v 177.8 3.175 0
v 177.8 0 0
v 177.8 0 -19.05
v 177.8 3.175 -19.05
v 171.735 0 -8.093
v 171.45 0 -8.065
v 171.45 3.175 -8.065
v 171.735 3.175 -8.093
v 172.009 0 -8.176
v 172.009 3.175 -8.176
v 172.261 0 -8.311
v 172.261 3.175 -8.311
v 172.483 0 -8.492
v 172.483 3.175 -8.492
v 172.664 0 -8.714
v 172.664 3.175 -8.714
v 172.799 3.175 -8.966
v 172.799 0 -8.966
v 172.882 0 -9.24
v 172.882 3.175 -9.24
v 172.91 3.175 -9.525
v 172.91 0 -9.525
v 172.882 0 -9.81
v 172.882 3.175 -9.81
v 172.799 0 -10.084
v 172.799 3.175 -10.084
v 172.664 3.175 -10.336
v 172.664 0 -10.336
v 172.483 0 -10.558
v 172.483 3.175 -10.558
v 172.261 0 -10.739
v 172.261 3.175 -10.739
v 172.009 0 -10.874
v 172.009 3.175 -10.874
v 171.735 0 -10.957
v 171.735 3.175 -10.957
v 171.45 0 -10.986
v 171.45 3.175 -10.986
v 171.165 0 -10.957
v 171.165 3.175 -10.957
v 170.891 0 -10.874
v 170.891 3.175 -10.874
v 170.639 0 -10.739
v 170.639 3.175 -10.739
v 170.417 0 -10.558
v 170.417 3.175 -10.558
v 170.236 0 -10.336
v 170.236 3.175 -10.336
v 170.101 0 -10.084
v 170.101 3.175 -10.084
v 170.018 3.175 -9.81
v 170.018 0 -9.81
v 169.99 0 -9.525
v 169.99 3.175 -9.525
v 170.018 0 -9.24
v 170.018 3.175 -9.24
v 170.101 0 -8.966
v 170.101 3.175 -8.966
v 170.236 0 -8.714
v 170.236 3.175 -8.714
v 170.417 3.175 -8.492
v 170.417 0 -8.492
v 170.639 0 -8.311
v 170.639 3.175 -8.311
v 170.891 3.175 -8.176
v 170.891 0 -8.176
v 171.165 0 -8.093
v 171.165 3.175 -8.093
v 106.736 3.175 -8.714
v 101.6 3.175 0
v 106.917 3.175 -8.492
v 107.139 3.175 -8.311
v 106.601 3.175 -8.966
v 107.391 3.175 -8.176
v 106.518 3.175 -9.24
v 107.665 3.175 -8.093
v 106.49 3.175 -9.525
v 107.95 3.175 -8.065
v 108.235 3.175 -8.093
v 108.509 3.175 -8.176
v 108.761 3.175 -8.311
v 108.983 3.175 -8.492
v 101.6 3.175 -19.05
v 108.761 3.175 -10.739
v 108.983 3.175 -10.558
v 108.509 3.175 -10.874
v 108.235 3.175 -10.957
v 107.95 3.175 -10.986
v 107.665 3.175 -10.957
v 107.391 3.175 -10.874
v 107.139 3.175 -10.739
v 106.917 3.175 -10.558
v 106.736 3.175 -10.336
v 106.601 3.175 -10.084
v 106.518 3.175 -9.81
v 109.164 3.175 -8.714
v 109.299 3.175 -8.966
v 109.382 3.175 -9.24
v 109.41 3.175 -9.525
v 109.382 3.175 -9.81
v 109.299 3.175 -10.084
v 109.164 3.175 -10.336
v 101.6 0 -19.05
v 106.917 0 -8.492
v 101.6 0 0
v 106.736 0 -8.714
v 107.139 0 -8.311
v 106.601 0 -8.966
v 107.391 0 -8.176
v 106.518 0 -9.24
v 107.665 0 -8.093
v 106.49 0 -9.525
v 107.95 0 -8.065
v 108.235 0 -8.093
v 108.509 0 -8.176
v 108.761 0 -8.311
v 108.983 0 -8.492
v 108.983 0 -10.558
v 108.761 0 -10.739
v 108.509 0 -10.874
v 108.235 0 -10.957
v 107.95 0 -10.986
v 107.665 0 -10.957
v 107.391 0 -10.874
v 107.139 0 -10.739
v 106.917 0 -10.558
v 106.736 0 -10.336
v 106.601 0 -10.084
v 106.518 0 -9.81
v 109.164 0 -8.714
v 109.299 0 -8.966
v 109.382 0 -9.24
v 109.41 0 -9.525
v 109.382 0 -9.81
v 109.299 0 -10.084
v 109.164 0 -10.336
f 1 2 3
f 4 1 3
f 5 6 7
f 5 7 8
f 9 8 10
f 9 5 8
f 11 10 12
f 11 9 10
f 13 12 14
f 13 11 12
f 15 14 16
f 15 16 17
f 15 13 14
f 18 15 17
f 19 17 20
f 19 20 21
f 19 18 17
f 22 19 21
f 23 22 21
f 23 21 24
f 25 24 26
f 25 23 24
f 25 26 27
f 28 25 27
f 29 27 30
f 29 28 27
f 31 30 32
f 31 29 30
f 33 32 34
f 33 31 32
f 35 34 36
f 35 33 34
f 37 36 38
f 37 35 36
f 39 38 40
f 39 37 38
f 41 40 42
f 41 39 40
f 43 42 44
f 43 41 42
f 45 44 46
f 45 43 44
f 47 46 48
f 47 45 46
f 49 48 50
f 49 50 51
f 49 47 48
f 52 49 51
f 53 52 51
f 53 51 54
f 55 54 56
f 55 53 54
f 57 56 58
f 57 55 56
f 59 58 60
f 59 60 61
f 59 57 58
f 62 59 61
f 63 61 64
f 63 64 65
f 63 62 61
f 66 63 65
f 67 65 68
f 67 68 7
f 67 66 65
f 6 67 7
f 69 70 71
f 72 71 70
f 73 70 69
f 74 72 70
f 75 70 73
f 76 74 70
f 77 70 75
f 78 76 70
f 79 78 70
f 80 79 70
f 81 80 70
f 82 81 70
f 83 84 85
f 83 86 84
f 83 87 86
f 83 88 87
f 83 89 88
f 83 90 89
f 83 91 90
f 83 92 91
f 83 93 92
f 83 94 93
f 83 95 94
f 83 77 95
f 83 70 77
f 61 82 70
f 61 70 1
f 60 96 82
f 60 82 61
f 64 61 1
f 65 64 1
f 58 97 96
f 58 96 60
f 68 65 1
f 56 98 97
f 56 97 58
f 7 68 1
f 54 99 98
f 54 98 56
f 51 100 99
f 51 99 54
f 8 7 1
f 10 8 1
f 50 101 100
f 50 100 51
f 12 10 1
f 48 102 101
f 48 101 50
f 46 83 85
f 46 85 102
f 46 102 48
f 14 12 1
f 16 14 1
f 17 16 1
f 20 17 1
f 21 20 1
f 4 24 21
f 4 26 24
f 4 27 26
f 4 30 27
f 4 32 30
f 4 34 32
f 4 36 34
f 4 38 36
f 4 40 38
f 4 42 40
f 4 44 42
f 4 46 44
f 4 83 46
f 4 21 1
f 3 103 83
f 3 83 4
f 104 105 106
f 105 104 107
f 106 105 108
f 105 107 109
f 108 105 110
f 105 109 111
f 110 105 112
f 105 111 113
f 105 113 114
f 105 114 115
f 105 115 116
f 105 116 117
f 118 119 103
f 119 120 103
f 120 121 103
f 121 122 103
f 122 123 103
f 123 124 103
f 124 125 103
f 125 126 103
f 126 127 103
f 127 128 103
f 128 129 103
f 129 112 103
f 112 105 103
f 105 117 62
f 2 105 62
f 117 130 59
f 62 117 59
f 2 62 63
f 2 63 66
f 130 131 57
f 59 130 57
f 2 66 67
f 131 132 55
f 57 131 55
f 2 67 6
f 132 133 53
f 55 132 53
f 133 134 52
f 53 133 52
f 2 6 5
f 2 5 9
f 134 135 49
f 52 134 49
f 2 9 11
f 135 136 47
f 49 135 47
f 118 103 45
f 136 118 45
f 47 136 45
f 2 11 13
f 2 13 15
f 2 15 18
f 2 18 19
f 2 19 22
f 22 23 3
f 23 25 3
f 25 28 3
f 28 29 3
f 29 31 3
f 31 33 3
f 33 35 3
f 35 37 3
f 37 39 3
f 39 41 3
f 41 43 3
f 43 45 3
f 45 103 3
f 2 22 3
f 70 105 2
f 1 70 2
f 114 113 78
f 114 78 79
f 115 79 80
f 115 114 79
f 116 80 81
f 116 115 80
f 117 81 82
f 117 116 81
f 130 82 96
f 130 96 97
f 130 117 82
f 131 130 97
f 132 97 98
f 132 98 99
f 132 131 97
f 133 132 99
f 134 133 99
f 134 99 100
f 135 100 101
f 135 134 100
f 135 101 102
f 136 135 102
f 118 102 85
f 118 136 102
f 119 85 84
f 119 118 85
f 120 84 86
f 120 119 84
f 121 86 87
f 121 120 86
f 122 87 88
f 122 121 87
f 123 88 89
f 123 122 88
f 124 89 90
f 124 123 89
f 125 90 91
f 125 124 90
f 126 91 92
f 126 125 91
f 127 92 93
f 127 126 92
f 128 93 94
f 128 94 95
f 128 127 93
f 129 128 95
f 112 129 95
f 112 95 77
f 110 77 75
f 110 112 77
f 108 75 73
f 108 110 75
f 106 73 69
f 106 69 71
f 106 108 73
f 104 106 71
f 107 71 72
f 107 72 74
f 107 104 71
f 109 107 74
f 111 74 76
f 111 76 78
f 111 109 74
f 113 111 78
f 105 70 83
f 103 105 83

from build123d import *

# Parameters (mm, degrees)
SKETCH1_W           = 177.8
SKETCH1_H           = 19.05
SKETCH1_R           = 1.4605
BOSS_EXTRUDE1_DEPTH = 3.175
SKETCH2_W           = 101.6
SKETCH2_H           = 19.05
CUT_EXTRUDE1_DEPTH  = 179.84580824


with BuildPart() as part:
    # Sketch1 → Boss-Extrude1 (new body)
    with BuildSketch(Plane(origin=(0, 0, 0), x_dir=(1, 0, 0), z_dir=(0, 1, 0))):
        with Locations((88.9, 9.525)):
            Rectangle(SKETCH1_W, SKETCH1_H)
        with Locations(Location((6.35, 9.525, 0), (0, 0, 270))):
            Circle(SKETCH1_R, mode=Mode.SUBTRACT)
        with Locations(Location((107.95, 9.525, 0), (0, 0, 270))):
            Circle(SKETCH1_R, mode=Mode.SUBTRACT)
        with Locations(Location((171.45, 9.525, 0), (0, 0, 270))):
            Circle(SKETCH1_R, mode=Mode.SUBTRACT)
    extrude(amount=BOSS_EXTRUDE1_DEPTH)

    # Sketch2 → Cut-Extrude1 (cut, through all)
    with BuildSketch(Plane(origin=(0, 3.175, 0), x_dir=(1, 0, 0), z_dir=(0, 1, 0))):
        with Locations((50.8, 9.525)):
            Rectangle(SKETCH2_W, SKETCH2_H)
    extrude(amount=-CUT_EXTRUDE1_DEPTH, mode=Mode.SUBTRACT)


solid = part.part
